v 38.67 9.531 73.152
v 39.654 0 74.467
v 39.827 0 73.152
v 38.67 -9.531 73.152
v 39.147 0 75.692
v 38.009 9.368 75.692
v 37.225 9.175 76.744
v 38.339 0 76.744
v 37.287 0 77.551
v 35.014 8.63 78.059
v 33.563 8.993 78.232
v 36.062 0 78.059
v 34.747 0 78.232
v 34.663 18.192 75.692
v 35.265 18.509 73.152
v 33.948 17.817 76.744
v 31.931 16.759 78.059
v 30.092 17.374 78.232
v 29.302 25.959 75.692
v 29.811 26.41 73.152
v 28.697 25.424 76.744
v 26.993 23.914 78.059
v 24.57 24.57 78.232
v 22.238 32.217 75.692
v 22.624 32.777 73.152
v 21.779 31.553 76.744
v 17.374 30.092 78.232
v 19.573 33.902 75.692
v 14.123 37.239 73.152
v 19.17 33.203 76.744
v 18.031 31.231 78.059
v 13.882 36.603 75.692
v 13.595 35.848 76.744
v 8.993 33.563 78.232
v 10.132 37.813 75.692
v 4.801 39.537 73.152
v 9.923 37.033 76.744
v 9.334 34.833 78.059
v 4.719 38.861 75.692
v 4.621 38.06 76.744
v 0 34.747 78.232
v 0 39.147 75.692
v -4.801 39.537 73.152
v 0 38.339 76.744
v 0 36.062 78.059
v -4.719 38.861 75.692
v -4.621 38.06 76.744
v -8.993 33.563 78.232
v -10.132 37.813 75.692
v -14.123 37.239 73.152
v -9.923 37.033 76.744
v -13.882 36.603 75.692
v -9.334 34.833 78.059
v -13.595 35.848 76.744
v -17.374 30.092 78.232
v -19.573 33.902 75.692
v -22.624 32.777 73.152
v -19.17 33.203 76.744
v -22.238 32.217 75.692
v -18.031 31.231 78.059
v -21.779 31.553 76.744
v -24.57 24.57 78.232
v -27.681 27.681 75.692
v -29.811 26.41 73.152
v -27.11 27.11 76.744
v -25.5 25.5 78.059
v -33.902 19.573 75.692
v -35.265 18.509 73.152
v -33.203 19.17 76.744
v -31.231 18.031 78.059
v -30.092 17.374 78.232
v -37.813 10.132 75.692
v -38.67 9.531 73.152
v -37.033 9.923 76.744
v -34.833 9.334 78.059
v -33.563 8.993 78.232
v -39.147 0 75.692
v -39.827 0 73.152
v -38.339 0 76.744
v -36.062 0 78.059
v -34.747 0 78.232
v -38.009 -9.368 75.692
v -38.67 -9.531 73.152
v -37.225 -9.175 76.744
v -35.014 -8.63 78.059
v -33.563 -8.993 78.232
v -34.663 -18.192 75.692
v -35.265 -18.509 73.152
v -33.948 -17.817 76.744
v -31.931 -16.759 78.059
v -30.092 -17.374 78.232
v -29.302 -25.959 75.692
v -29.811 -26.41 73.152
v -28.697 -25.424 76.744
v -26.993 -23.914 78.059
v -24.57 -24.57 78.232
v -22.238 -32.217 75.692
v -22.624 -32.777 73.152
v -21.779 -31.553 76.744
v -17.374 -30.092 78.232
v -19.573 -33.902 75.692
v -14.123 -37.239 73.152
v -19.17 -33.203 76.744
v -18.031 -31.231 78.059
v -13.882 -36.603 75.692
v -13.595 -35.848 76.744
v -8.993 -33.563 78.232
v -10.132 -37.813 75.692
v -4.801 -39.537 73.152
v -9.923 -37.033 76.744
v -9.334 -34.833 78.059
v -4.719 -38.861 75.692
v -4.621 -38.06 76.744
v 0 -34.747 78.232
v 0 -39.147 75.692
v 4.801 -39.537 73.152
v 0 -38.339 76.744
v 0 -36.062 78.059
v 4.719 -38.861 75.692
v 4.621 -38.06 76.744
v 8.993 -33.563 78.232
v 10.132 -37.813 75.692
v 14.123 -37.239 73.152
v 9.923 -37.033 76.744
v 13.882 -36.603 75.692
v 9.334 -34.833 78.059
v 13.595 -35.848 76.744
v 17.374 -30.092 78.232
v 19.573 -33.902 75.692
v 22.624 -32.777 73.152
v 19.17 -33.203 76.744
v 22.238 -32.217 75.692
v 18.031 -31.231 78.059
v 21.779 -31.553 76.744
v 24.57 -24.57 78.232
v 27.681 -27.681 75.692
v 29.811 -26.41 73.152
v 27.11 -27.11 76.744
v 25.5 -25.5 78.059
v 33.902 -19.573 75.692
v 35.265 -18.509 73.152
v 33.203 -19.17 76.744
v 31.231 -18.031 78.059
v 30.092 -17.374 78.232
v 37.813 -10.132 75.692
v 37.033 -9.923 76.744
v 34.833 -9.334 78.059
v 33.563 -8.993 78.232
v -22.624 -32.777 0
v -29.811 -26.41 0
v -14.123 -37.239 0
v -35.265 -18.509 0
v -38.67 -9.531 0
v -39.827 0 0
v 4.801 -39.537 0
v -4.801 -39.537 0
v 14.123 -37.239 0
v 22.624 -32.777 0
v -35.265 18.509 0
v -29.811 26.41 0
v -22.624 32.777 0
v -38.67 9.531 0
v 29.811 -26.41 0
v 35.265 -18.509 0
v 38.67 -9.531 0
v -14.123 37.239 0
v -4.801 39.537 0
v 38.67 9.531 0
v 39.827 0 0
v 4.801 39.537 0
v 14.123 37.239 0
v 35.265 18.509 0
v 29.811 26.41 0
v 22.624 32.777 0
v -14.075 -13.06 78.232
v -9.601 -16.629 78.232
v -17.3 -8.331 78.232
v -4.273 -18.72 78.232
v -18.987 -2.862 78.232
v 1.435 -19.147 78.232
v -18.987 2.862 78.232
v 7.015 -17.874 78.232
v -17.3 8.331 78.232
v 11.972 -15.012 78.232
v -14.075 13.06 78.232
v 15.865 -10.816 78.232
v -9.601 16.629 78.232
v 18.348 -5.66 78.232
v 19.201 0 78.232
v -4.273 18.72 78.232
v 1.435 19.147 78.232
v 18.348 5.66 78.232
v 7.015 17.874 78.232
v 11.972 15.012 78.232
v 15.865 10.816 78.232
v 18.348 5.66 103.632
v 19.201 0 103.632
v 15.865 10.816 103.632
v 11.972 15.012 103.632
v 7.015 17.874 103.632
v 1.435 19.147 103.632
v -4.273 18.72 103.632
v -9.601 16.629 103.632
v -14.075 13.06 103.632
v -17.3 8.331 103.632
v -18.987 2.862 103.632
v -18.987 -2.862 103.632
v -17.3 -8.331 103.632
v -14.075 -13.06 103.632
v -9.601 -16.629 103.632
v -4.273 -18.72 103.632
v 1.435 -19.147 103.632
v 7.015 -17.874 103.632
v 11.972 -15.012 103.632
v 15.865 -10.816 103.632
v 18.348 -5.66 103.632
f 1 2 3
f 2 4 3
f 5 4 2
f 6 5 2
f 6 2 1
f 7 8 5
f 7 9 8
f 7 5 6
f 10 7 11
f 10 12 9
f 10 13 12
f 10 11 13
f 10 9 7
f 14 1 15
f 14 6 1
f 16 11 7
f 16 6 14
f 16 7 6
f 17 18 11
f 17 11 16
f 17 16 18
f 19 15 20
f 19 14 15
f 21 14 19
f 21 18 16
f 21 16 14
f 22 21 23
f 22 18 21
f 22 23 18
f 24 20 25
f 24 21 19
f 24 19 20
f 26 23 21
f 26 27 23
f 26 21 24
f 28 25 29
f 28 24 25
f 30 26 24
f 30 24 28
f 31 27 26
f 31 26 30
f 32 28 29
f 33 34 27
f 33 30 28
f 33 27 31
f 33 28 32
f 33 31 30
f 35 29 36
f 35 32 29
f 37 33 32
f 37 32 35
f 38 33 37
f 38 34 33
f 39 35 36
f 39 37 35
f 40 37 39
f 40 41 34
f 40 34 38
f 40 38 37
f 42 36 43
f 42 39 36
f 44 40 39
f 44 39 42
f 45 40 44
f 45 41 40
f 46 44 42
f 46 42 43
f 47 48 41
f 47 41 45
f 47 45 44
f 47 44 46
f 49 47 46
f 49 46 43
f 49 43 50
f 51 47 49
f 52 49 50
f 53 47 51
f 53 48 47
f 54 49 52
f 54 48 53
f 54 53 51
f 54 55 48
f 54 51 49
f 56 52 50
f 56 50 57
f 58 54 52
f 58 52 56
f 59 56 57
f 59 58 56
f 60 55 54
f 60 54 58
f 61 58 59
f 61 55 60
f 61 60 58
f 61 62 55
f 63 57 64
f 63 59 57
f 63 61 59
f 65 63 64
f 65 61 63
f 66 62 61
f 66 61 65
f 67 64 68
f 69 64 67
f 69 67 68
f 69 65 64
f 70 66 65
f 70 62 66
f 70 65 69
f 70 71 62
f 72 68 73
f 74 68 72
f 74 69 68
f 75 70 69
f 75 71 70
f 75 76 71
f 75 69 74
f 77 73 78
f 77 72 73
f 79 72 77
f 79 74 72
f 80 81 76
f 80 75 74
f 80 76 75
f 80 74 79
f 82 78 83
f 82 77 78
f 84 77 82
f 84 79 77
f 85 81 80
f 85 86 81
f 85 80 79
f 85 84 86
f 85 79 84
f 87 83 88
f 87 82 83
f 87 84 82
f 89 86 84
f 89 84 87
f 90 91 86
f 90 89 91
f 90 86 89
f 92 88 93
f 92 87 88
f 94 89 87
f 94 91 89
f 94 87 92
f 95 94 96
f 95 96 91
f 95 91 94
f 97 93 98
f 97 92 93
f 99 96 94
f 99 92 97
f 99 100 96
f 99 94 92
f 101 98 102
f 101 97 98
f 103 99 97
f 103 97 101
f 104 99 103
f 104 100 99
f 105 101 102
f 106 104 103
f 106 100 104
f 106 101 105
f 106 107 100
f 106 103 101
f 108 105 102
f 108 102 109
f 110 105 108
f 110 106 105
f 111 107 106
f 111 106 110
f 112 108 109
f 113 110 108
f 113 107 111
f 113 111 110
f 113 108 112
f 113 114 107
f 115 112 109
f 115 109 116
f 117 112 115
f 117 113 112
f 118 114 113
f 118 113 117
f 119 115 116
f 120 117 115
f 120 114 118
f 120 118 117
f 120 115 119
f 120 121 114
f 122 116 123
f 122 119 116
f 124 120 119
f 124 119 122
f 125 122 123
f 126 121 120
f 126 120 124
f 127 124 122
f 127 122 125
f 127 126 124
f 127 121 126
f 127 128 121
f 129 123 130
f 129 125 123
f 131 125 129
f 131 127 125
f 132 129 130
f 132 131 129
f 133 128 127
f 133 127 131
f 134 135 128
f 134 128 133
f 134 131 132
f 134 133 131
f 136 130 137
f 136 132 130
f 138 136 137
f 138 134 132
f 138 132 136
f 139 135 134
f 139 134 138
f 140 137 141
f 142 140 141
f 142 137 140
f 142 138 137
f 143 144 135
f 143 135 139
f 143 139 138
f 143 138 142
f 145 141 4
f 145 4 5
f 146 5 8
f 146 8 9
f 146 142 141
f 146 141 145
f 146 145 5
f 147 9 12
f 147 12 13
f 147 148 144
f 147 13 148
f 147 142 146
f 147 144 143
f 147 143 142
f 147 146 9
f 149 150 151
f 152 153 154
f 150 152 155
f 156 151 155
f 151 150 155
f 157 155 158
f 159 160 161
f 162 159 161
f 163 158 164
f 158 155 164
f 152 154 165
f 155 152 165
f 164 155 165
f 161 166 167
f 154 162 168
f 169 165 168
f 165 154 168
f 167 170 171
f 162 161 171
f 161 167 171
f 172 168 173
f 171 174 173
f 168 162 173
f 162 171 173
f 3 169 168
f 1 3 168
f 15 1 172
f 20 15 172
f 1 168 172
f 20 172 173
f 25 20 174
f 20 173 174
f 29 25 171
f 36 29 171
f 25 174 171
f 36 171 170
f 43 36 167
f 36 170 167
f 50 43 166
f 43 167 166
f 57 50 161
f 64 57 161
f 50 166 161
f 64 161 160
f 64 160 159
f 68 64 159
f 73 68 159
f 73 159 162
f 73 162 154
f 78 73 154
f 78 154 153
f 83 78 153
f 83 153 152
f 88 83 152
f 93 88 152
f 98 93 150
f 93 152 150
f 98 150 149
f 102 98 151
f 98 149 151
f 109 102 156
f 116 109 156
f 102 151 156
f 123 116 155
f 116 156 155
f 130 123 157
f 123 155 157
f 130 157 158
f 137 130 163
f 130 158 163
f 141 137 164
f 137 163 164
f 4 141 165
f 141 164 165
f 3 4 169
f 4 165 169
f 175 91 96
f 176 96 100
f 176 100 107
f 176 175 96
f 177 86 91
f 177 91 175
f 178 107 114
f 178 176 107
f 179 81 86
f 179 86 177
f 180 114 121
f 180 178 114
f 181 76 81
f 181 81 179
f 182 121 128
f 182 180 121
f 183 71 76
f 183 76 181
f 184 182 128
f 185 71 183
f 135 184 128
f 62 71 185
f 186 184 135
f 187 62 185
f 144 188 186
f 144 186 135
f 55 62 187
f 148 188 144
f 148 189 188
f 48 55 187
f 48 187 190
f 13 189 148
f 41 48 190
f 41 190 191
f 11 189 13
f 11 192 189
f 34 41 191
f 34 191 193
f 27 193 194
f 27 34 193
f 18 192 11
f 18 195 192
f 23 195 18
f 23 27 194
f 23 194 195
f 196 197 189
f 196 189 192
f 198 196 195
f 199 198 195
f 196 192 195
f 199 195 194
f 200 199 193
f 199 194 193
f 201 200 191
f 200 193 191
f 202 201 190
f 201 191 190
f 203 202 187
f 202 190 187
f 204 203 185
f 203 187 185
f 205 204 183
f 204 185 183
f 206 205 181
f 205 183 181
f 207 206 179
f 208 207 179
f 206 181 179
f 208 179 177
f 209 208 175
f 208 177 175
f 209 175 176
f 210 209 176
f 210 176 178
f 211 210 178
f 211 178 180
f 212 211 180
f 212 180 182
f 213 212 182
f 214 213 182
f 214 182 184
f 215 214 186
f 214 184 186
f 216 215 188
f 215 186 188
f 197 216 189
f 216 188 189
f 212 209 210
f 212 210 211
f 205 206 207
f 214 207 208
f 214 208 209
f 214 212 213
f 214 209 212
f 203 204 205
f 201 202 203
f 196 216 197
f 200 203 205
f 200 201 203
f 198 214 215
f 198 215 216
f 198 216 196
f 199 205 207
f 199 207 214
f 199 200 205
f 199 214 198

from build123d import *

# Parameters (mm, degrees)
F0_R     = 39.8272
F1_DEPTH = 78.232
F2_R     = 5.08
F3_R     = 19.201024
F4_DEPTH = 25.4


with BuildPart() as f1:
    # F0 (on Top) → F1 (new body)
    with BuildSketch(Plane.XY):
        Circle(F0_R)
    extrude(amount=F1_DEPTH)

    # F2
    f2_edges = [f1.edges().sort_by_distance(p)[0] for p in [
        (-39.8272, 0, 78.232),
    ]]
    fillet(f2_edges, radius=F2_R)

    # F3 (on face) → F4 (join)
    with BuildSketch(Plane.XY.offset(78.232)):
        Circle(F3_R)
    extrude(amount=F4_DEPTH)


solid = f1.part
